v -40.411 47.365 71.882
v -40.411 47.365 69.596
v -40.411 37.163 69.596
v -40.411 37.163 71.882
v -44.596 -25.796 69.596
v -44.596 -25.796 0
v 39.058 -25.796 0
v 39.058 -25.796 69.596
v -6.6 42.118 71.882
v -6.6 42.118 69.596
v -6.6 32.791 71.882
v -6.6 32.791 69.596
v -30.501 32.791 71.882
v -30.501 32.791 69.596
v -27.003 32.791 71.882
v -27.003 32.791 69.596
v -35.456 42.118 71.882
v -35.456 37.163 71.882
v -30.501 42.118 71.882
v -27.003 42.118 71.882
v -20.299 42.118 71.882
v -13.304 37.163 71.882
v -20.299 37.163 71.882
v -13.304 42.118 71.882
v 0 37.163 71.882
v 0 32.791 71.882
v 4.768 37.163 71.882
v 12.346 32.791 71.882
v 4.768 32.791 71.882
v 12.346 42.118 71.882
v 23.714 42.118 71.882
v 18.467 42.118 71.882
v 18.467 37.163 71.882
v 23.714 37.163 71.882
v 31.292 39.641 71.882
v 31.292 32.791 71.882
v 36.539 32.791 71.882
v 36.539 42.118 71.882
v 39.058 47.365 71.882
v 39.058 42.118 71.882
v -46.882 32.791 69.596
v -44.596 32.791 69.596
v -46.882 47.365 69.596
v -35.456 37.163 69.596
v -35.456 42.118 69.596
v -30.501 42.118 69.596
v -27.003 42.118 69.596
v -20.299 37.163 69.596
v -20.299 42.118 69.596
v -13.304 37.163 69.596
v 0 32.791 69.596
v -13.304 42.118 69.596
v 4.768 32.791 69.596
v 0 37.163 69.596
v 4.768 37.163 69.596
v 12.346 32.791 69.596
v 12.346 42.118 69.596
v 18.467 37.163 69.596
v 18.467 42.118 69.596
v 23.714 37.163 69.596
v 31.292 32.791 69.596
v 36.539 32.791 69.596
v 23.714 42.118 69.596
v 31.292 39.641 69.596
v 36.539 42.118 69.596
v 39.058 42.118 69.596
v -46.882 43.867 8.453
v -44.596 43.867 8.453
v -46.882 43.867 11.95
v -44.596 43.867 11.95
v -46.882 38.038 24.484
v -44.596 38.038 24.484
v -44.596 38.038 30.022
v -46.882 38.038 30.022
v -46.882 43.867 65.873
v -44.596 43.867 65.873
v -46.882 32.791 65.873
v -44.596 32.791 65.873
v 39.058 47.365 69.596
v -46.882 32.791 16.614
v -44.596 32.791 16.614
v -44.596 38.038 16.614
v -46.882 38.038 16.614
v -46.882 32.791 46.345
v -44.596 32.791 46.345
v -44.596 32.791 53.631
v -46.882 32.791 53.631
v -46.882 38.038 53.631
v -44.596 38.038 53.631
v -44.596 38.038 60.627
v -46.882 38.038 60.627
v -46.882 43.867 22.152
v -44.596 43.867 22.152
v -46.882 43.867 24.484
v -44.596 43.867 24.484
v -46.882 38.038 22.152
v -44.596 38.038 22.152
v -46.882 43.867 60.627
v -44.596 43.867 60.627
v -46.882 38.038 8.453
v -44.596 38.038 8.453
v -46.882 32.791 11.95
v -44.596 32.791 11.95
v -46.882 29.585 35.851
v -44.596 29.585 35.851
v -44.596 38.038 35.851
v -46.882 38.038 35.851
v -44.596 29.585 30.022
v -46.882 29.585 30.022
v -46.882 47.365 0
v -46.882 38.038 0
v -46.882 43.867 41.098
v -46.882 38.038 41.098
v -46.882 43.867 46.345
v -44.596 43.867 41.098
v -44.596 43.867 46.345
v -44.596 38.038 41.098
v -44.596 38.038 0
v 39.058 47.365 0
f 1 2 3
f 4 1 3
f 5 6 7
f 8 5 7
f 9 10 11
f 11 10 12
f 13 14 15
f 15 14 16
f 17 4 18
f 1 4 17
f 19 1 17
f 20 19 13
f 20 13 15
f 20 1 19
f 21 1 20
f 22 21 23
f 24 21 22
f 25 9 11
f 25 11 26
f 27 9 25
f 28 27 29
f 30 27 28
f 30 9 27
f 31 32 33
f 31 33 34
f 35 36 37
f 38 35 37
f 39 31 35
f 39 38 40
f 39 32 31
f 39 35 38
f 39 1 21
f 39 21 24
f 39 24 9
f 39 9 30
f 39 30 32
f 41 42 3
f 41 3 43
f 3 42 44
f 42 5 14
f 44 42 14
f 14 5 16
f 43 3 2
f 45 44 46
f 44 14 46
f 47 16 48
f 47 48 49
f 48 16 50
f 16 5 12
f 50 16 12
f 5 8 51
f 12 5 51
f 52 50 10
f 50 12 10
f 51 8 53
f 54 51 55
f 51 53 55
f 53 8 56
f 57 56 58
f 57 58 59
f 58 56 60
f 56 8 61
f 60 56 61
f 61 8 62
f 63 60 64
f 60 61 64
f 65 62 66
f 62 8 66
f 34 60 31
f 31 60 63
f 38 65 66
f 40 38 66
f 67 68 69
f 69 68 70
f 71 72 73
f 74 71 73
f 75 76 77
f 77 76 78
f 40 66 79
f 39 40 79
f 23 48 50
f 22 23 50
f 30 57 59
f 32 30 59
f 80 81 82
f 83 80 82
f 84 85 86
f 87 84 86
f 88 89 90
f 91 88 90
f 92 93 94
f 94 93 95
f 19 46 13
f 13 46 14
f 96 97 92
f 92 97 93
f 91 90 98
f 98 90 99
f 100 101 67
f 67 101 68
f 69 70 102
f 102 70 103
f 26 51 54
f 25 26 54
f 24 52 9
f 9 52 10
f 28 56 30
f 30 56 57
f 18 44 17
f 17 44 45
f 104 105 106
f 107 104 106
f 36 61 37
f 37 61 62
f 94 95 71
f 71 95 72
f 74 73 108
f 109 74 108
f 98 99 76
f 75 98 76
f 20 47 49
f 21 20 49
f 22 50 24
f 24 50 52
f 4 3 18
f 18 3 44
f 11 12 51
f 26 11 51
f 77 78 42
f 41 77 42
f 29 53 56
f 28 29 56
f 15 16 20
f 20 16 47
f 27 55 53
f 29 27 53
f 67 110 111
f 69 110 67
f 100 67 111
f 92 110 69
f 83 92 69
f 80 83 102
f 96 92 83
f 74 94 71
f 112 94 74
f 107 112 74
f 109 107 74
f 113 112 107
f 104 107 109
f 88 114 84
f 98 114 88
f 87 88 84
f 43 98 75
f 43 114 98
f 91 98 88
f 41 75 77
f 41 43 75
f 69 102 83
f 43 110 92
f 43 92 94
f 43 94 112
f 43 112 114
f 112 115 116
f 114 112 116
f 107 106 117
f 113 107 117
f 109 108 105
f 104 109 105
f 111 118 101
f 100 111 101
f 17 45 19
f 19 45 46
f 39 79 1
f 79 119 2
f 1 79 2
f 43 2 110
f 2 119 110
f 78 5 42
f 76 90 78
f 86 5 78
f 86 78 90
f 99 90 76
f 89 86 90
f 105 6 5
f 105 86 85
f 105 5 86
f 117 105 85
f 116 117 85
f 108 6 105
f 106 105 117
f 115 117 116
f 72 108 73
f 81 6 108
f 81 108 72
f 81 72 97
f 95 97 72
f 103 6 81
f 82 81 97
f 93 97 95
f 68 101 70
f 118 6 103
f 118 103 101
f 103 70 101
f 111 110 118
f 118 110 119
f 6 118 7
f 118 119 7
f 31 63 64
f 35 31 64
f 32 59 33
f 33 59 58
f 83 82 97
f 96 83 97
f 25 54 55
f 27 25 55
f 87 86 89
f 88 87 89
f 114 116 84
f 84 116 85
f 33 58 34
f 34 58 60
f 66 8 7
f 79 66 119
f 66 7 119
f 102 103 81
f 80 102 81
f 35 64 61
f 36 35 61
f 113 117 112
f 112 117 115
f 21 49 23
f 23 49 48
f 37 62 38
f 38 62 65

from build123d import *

# Parameters (mm, degrees)
F0_W     = 83.653443
F0_H     = 73.160328
F1_DEPTH = 69.596
F3_DEPTH = 2.286
F5_DEPTH = 2.286


with BuildPart() as f1:
    # F0 (on Top) → F1 (new body)
    with BuildSketch(Plane.XY):
        with Locations((-2.769016, 10.784589)):
            Rectangle(F0_W, F0_H)
    extrude(amount=F1_DEPTH)

    # F2 (on face) → F3 (join)
    with BuildSketch(Plane(origin=(-44.595737, 0, 0), x_dir=(0, -1, 0), z_dir=(-1, 0, 0))):
        Polygon((-47.364753, 0), (-38.037542, 0), (-38.037542, 8.452787), (-43.867048, 8.452787), (-43.867048, 11.950491), (-32.790981, 11.950491), (-32.790981, 16.6141), (-38.037542, 16.6141), (-38.037542, 22.152131), (-43.867048, 22.152131), (-43.867048, 24.483934), (-38.037542, 24.483934), (-38.037542, 30.021966), (-29.584754, 30.021966), (-29.584754, 35.851479), (-38.037542, 35.851479), (-38.037542, 41.098036), (-43.867048, 41.098036), (-43.867048, 46.344589), (-32.790981, 46.344589), (-32.790981, 53.631473), (-38.037542, 53.631473), (-38.037542, 60.626887), (-43.867048, 60.626887), (-43.867048, 65.873444), (-32.790981, 65.873444), (-32.790981, 69.596), (-47.364753, 69.596), align=None)
    extrude(amount=F3_DEPTH)

    # F4 (on face) → F5 (join)
    with BuildSketch(Plane.XY.offset(69.596)):
        Polygon((39.057706, 47.364753), (-40.410984, 47.364753), (-40.410984, 37.163116), (-35.455901, 37.163116), (-35.455901, 42.118195), (-30.50082, 42.118195), (-30.50082, 32.790981), (-27.003115, 32.790981), (-27.003115, 42.118195), (-20.299181, 42.118195), (-20.299181, 37.163116), (-13.303772, 37.163116), (-13.303772, 42.118195), (-6.599837, 42.118195), (-6.599837, 32.790981), (0, 32.790981), (0, 37.163116), (4.767703, 37.163116), (4.767703, 32.790981), (12.346066, 32.790981), (12.346066, 42.118195), (18.467048, 42.118195), (18.467048, 37.163116), (23.713607, 37.163116), (23.713607, 42.118195), (31.291965, 39.640656), (31.291965, 32.790981), (36.538523, 32.790981), (36.538523, 42.118195), (39.057706, 42.118195), align=None)
    extrude(amount=F5_DEPTH)


solid = f1.part
